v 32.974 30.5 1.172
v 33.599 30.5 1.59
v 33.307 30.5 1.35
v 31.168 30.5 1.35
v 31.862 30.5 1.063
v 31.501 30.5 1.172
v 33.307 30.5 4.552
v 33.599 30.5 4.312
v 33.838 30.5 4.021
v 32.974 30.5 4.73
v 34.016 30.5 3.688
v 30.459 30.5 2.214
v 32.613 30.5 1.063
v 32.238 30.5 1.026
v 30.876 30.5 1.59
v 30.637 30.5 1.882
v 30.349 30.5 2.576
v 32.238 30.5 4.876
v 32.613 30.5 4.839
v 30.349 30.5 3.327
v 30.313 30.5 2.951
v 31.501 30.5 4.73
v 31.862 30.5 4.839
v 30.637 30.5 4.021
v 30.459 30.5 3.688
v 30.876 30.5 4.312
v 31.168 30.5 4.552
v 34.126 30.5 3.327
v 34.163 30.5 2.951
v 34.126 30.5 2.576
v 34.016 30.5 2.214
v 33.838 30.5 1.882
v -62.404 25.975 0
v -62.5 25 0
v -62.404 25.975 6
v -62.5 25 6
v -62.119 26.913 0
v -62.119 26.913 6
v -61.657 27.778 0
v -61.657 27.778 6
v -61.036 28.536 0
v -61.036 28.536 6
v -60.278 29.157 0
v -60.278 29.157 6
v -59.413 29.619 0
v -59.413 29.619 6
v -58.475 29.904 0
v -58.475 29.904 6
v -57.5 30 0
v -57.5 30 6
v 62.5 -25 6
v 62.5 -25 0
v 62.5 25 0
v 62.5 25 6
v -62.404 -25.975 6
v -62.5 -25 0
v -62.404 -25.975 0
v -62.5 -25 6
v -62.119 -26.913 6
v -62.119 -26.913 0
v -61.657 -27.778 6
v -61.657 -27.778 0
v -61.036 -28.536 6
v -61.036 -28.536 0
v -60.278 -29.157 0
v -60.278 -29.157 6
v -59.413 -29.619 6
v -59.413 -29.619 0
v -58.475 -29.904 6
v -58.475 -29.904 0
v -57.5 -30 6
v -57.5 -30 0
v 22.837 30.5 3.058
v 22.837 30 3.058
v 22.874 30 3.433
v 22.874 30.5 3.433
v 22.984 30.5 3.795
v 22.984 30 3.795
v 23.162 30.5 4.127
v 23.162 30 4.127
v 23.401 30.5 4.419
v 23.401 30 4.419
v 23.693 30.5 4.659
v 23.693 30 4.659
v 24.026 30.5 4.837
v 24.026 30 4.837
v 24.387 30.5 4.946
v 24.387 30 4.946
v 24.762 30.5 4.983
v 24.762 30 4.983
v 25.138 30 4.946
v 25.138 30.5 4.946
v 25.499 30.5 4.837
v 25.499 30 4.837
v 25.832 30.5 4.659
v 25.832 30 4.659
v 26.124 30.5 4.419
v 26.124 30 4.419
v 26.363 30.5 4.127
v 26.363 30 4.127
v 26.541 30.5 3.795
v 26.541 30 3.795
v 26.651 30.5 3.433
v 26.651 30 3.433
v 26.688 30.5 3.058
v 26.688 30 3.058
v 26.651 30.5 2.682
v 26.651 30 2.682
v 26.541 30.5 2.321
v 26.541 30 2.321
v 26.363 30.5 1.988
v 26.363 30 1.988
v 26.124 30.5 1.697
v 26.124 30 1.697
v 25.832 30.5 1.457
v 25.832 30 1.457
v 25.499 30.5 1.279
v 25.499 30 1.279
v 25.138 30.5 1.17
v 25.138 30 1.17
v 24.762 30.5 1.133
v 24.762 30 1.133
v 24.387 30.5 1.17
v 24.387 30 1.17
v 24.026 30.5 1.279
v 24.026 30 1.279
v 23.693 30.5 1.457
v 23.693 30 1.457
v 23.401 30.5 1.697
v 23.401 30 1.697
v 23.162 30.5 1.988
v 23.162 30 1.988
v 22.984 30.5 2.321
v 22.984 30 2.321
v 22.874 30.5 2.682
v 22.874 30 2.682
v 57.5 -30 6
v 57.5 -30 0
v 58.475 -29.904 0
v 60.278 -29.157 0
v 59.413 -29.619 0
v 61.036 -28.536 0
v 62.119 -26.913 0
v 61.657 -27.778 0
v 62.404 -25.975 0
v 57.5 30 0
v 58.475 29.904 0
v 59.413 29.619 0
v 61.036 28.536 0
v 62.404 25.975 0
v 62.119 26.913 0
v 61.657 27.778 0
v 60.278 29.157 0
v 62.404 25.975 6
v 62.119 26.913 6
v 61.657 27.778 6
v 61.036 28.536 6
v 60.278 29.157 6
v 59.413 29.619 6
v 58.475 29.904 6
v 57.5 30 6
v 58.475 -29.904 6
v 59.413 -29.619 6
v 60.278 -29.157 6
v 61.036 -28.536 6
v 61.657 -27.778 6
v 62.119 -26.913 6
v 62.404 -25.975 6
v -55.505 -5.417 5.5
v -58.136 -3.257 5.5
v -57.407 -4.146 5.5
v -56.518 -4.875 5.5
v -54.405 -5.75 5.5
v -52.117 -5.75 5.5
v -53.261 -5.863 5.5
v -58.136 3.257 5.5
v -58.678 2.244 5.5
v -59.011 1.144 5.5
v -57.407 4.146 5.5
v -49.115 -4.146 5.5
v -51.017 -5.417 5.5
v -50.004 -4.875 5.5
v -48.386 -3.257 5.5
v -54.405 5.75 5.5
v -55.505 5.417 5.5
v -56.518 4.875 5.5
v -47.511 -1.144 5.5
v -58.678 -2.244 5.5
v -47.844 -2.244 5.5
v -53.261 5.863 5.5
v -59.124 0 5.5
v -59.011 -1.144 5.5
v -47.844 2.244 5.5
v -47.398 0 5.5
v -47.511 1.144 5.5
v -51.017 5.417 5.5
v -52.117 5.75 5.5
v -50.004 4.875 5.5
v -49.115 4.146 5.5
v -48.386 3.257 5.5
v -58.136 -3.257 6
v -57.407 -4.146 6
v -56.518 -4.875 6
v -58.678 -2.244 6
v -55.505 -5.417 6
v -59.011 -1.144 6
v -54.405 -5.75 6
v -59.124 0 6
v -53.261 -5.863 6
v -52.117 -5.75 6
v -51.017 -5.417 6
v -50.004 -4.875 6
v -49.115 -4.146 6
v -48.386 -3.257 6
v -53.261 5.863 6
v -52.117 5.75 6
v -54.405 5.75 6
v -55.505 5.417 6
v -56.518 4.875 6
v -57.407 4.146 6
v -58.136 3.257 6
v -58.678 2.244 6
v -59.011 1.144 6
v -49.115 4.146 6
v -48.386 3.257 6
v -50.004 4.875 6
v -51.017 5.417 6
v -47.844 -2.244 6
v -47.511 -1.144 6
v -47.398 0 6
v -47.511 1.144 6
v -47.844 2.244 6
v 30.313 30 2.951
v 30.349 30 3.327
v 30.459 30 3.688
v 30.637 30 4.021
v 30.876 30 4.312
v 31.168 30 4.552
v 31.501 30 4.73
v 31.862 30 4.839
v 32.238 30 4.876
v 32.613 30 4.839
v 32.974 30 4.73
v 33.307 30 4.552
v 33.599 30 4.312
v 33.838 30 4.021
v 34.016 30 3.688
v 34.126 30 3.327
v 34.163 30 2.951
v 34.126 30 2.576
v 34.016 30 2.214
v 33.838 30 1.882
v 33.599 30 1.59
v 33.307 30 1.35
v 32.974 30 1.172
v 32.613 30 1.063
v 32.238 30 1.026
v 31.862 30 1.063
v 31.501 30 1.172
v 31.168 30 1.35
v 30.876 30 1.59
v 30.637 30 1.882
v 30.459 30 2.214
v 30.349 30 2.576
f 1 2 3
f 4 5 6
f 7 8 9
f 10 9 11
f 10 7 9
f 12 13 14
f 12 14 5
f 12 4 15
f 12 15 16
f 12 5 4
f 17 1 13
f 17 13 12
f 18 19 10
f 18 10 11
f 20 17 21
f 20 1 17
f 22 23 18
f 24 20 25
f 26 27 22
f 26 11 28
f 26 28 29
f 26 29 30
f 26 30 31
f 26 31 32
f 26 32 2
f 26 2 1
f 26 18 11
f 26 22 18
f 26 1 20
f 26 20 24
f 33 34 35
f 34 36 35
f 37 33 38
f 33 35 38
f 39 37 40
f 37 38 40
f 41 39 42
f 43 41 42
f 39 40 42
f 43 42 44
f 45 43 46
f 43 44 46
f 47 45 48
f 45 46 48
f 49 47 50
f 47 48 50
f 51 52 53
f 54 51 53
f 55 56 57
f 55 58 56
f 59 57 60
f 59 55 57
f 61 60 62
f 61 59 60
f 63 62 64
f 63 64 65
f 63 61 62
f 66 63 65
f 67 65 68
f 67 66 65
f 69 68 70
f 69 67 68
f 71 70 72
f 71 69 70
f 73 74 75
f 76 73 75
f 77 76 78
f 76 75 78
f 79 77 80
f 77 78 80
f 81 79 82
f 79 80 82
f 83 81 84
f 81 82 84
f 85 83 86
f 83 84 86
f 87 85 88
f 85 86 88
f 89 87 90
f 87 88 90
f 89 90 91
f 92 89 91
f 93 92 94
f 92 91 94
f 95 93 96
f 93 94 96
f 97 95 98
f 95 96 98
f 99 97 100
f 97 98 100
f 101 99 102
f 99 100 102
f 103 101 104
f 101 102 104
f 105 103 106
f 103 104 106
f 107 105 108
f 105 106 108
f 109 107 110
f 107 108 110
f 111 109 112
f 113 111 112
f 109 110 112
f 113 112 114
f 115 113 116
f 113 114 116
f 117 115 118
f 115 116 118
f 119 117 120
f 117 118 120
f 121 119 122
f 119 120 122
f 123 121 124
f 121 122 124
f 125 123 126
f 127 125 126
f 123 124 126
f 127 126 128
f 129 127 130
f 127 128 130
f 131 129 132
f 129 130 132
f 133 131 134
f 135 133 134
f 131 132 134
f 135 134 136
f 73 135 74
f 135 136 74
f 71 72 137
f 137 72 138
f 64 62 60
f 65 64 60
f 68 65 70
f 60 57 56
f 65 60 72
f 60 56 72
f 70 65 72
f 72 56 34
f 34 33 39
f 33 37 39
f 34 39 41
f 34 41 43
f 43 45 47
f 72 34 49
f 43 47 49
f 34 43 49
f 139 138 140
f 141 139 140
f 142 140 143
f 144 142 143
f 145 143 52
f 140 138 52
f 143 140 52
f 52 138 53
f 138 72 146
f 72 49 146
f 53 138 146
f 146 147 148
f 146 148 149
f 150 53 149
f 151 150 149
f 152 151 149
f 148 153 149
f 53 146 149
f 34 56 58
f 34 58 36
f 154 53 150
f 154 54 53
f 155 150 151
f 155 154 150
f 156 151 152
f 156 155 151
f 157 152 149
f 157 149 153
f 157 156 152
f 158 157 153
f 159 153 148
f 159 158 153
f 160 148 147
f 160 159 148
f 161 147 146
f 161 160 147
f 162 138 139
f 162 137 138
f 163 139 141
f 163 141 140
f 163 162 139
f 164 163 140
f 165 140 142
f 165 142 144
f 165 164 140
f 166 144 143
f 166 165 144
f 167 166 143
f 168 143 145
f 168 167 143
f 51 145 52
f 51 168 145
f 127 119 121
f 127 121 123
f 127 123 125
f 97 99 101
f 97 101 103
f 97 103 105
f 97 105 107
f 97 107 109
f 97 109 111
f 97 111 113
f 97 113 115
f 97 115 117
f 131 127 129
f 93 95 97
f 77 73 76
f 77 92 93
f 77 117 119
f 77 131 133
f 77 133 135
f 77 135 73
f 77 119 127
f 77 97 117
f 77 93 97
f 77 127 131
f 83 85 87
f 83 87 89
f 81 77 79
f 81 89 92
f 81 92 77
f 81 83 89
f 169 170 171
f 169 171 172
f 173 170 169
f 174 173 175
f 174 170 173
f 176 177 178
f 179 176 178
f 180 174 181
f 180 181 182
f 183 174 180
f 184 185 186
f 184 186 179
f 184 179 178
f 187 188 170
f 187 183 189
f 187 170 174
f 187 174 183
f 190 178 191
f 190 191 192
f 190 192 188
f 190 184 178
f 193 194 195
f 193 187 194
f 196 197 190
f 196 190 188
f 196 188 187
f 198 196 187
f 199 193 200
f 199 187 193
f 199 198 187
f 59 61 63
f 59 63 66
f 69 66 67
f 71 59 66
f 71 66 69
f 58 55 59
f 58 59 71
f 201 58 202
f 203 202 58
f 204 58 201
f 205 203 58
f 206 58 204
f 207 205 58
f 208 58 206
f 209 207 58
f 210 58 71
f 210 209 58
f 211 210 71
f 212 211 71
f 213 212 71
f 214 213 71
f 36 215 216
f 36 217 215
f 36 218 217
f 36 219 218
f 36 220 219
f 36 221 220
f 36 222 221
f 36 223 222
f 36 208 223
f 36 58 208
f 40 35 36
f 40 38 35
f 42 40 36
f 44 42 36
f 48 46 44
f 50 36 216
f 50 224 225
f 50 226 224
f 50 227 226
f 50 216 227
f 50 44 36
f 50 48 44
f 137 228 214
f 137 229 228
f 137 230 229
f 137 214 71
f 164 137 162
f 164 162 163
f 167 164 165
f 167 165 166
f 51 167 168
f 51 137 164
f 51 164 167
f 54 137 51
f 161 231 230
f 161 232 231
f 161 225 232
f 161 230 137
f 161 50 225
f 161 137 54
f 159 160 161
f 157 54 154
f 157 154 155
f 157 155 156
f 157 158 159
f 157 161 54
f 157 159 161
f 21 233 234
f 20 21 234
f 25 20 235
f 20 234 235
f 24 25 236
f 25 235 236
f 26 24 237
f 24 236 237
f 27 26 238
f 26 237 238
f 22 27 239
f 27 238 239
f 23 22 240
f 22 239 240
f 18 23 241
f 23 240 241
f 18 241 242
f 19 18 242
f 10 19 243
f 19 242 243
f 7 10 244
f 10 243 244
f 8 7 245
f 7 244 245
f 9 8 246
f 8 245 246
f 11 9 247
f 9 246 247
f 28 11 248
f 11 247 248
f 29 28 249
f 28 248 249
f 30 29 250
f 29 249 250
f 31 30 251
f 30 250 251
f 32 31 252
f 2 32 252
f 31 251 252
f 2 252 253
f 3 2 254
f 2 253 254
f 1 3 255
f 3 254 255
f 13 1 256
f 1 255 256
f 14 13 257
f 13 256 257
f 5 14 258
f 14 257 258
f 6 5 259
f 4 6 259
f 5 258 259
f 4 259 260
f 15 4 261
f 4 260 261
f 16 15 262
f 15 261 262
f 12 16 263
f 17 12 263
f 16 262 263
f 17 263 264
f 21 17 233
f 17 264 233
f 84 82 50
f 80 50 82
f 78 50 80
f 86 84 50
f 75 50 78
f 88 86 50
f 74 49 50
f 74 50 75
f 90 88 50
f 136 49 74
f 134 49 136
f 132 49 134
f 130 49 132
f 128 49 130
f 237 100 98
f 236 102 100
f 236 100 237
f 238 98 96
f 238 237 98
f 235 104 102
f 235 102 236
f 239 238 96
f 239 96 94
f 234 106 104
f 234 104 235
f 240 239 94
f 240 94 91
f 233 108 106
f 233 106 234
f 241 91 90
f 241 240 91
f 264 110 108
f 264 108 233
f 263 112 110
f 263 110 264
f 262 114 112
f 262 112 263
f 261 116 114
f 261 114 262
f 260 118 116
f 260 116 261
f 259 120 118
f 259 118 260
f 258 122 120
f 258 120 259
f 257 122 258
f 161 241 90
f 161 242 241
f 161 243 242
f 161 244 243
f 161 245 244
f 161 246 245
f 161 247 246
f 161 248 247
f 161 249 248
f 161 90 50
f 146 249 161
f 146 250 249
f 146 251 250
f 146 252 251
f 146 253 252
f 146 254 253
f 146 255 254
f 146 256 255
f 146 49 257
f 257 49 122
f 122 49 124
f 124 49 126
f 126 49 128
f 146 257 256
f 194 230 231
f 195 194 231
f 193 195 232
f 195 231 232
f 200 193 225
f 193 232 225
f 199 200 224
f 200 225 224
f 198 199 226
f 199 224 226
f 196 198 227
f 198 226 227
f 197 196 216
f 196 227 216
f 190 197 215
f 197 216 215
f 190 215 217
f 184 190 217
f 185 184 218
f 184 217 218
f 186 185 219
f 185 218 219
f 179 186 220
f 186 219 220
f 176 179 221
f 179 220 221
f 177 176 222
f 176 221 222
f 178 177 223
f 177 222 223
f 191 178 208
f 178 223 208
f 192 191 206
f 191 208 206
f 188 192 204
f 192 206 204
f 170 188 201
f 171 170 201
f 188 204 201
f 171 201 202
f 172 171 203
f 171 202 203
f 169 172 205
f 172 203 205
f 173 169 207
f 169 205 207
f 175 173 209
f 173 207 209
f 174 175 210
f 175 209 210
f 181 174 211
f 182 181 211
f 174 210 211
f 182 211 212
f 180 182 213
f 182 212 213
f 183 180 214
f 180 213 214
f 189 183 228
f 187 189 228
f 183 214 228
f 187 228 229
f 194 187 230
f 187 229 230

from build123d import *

# Parameters (mm, degrees)
F0_W     = 125
F0_H     = 60
F1_DEPTH = 6
F2_R     = 5
F3_R     = 5
F4_R     = 1.925177
F5_DEPTH = 0.5
F6_R     = 1.925177
F7_DEPTH = 0.5
F8_R     = 5.863053
F9_DEPTH = 0.5


with BuildPart() as f1:
    # F0 (on Top) → F1 (new body)
    with BuildSketch(Plane.XY):
        Rectangle(F0_W, F0_H)
    extrude(amount=F1_DEPTH)

    # F2
    f2_edges = [f1.edges().sort_by_distance(p)[0] for p in [
        (-62.5, 30, 3),
        (62.5, 30, 3),
        (62.5, -30, 3),
    ]]
    fillet(f2_edges, radius=F2_R)

    # F3
    f3_edges = [f1.edges().sort_by_distance(p)[0] for p in [
        (-62.5, -30, 3),
    ]]
    fillet(f3_edges, radius=F3_R)

    # F4 (on face) → F5 (join)
    with BuildSketch(Plane(origin=(0, 30, 0), x_dir=(-1, 0, 0), z_dir=(0, 1, 0))):
        with Locations((-32.237682, 2.95109)):
            Circle(F4_R)
    extrude(amount=F5_DEPTH)

    # F6 (on face) → F7 (join)
    with BuildSketch(Plane(origin=(0, 30, 0), x_dir=(-1, 0, 0), z_dir=(0, 1, 0))):
        with Locations((-24.762407, 3.057879)):
            Circle(F6_R)
    extrude(amount=F7_DEPTH)

    # F8 (on face) → F9 (cut)
    with BuildSketch(Plane.XY.offset(6)):
        with Locations((-53.260919, 0)):
            Circle(F8_R)
    extrude(amount=-F9_DEPTH, mode=Mode.SUBTRACT)


solid = f1.part
